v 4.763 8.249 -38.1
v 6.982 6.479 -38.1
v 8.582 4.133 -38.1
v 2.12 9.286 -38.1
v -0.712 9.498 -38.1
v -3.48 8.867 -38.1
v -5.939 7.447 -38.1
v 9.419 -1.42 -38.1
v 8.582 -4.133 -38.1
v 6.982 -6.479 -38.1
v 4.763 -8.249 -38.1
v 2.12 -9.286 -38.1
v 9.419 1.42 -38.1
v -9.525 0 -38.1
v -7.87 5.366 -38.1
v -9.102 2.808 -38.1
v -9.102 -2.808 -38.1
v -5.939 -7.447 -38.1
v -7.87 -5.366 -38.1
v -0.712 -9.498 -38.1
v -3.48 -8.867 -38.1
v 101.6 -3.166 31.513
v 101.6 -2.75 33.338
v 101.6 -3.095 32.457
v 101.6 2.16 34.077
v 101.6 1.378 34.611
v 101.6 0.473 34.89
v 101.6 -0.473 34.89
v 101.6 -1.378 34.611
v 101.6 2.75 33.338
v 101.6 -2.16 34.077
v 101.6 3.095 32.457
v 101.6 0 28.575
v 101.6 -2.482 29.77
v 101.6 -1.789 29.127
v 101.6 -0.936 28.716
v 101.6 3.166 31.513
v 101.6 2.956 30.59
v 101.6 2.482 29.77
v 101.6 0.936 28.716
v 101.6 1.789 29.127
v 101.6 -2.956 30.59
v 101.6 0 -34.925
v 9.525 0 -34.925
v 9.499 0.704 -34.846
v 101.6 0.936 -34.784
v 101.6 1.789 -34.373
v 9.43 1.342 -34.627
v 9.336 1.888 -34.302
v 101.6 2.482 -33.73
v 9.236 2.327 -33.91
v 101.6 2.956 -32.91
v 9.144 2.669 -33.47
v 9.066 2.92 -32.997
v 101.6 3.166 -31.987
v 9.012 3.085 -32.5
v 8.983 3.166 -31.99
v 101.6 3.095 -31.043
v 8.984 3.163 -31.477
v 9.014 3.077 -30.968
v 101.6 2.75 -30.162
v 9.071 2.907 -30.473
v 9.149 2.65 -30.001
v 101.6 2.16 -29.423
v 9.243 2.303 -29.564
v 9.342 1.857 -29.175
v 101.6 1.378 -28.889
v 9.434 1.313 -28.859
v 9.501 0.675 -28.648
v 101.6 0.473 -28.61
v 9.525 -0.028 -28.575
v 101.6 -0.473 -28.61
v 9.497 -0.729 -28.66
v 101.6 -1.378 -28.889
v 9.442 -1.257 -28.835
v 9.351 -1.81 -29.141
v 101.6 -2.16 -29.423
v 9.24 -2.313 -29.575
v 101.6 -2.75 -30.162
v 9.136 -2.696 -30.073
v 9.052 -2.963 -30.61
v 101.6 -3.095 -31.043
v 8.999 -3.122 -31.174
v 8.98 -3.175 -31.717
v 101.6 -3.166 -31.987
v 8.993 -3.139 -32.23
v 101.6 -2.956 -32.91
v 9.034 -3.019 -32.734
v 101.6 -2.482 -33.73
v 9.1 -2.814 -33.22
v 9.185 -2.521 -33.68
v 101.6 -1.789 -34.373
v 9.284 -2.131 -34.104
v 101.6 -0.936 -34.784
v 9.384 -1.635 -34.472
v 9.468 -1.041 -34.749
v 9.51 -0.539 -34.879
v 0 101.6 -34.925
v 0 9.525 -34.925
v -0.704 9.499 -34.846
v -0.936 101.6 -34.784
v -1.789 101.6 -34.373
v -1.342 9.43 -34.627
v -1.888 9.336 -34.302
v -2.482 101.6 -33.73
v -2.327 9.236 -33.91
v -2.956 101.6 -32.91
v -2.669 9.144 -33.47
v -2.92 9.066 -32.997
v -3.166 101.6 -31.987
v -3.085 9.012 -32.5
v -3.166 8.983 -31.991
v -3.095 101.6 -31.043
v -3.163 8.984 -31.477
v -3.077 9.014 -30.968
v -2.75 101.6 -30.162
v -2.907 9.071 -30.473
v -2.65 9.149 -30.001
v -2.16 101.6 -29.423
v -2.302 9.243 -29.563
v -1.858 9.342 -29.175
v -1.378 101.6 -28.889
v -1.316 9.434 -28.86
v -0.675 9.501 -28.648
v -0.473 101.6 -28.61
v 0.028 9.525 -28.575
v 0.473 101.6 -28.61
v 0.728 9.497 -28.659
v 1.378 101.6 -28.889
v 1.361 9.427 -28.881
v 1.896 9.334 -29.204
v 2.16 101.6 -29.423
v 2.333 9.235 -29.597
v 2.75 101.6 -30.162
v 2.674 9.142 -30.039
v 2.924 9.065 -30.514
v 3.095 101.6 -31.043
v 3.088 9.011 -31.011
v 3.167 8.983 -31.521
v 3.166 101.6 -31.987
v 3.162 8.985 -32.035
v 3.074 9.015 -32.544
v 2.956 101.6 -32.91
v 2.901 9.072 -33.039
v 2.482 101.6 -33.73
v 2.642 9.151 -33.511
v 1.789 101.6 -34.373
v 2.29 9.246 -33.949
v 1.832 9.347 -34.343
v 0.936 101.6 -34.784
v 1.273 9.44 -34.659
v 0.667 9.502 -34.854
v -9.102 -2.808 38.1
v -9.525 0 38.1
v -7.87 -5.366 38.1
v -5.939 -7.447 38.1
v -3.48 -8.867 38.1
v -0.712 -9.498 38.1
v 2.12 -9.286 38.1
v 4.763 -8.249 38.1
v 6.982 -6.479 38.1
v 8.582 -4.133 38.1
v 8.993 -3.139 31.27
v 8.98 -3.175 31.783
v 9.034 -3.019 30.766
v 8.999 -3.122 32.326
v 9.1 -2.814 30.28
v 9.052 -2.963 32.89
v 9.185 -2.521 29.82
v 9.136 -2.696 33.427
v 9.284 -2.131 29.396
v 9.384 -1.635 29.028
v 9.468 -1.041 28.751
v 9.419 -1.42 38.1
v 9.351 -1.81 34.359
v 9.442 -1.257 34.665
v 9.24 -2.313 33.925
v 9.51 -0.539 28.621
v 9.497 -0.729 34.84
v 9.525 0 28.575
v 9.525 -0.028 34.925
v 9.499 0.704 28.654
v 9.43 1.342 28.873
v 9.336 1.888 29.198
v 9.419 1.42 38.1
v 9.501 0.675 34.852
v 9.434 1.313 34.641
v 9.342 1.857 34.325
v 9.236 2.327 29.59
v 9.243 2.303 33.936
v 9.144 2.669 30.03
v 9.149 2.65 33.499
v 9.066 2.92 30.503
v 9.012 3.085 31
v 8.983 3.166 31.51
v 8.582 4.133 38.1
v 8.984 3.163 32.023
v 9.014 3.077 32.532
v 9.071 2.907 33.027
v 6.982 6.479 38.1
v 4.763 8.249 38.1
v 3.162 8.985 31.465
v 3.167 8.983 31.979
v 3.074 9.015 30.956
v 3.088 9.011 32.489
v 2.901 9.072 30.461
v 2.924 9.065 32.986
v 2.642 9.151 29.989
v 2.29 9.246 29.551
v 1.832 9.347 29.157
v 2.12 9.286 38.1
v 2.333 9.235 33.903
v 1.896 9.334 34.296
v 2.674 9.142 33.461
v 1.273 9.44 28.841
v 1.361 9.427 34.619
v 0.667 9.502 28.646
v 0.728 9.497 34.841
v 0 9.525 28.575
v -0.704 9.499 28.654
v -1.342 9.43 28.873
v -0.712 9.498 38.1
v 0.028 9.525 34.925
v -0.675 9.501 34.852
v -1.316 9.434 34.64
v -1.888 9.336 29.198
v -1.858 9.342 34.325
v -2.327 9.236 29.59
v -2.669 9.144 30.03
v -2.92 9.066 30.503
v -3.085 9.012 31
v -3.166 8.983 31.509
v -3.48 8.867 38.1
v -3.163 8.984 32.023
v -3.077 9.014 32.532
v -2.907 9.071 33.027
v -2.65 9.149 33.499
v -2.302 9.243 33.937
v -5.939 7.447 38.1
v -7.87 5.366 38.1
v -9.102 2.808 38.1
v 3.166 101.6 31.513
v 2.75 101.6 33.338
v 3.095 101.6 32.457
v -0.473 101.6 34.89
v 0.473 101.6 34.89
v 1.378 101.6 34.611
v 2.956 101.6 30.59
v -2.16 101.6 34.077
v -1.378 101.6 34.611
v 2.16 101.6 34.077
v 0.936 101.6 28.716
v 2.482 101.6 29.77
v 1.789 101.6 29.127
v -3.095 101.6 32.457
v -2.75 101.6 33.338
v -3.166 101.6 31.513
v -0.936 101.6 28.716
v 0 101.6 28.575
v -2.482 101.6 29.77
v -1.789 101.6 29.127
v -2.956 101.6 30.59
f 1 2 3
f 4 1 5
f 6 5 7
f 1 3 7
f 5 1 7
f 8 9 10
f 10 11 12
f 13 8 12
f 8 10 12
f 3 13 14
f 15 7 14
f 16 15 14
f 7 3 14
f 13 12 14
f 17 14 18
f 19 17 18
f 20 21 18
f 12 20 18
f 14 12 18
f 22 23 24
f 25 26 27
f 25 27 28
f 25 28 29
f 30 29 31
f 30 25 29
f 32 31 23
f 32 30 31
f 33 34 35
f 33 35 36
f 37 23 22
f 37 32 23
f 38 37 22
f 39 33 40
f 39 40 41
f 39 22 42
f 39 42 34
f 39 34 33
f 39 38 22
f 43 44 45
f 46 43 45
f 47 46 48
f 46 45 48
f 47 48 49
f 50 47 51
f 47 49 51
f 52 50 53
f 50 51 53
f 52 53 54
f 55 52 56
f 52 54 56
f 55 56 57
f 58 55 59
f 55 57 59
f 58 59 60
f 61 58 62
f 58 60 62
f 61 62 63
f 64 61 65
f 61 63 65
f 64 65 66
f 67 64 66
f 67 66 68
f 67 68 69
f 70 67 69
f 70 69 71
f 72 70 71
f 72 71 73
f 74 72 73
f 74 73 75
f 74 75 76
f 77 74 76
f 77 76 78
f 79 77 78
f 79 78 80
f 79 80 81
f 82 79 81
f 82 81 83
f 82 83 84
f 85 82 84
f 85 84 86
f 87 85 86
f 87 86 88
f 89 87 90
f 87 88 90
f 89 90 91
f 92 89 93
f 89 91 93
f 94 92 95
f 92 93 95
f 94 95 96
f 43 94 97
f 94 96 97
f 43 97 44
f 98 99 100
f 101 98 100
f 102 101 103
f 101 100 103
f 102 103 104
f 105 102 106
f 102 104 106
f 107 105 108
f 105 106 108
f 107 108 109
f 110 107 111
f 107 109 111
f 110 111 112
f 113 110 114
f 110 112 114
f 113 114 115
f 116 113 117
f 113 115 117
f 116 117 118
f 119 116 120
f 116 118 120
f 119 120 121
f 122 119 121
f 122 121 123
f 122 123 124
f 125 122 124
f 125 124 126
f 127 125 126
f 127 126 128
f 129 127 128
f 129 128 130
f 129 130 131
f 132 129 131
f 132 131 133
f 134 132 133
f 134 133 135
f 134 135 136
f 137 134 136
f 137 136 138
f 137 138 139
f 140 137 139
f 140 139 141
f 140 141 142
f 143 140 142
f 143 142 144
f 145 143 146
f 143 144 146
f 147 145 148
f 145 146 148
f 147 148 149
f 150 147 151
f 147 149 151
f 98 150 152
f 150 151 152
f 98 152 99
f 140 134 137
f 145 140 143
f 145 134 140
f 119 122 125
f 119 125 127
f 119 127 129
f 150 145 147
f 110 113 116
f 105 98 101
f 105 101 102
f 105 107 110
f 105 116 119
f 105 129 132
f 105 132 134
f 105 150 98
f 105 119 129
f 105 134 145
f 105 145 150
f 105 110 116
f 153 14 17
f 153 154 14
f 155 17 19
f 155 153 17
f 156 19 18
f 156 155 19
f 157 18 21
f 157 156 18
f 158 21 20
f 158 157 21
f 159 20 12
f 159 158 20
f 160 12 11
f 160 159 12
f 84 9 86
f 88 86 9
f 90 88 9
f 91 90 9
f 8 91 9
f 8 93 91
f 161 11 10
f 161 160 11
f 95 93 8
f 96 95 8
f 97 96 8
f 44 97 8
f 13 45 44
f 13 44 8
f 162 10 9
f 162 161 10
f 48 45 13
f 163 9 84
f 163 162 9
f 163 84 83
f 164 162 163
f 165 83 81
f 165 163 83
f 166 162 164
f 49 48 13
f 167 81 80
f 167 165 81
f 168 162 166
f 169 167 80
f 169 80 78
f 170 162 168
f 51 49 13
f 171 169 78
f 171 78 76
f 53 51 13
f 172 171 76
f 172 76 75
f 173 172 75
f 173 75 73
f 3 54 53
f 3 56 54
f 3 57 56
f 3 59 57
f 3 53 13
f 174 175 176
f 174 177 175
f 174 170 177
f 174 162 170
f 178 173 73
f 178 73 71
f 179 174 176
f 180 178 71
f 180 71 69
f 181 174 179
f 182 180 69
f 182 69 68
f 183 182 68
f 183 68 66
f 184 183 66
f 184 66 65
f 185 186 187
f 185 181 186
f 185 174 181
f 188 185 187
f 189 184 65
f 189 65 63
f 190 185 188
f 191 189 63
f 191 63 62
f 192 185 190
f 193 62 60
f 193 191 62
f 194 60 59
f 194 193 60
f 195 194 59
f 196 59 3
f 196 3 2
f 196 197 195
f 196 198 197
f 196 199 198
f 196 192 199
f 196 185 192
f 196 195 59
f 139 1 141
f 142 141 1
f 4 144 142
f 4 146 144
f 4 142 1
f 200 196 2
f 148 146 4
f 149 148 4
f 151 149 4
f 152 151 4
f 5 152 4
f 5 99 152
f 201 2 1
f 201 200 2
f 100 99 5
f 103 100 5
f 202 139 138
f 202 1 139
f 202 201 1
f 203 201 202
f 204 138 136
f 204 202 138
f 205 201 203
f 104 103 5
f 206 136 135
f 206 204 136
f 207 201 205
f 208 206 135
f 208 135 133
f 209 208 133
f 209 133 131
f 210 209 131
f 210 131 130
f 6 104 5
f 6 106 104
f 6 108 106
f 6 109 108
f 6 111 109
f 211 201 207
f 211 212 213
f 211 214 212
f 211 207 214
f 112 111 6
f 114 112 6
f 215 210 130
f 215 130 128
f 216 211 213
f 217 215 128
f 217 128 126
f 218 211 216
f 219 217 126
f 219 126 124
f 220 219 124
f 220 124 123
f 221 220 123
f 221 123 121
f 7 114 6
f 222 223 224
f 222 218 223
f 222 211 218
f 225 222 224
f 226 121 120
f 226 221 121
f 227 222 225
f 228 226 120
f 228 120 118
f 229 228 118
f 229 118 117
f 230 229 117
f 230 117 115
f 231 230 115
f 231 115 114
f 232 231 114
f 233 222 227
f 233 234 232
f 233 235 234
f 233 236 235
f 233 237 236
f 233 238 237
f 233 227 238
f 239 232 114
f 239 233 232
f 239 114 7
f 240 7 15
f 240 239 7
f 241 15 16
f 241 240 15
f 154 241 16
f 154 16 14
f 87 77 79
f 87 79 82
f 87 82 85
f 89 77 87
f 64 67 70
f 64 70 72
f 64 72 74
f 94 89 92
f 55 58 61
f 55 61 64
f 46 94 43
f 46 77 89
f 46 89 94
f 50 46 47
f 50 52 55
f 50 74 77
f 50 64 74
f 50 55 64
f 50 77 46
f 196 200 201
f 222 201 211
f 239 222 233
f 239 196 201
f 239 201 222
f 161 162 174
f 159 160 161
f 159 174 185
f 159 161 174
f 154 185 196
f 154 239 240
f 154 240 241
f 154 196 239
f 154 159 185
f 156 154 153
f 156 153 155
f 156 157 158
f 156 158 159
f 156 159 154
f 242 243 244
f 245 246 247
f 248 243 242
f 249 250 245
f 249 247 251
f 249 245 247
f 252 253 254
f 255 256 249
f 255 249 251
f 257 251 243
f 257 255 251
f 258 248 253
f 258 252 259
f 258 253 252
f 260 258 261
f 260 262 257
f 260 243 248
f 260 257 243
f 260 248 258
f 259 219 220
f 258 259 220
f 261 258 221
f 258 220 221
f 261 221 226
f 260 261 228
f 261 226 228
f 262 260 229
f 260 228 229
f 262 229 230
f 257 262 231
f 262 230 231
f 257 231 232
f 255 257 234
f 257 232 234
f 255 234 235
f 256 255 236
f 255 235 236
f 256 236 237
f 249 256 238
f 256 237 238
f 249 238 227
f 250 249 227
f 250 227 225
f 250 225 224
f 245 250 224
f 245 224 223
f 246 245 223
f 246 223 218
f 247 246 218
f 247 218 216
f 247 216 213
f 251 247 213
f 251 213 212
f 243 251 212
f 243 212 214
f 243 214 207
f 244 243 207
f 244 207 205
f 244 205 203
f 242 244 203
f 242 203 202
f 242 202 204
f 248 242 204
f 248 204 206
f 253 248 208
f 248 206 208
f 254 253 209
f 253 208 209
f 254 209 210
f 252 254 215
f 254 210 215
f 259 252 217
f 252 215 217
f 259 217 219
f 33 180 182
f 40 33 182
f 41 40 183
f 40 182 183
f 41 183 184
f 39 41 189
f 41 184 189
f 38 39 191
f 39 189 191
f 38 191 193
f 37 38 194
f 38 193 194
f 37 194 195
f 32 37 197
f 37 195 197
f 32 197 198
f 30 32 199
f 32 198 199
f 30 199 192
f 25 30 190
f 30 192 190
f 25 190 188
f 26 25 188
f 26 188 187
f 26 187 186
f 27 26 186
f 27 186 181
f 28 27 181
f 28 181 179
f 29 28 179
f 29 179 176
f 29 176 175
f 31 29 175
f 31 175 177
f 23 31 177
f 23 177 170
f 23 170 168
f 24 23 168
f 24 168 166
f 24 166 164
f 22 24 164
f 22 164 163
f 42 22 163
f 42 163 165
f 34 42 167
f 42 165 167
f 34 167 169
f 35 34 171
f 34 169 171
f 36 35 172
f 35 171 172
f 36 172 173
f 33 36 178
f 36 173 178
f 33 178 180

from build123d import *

# Parameters (mm, degrees)
SKETCH1_R           = 9.525
BOSS_EXTRUDE1_DEPTH = 38.1
SKETCH2_R           = 3.175
BOSS_EXTRUDE2_DEPTH = 101.6
SKETCH3_R           = 3.175
BOSS_EXTRUDE3_DEPTH = 101.6


with BuildPart() as part:
    # Sketch1 → Boss-Extrude1 (new, symmetric)
    with BuildSketch(Plane.XY):
        with Locations(Location((0, 0, 0), (0, 0, 180))):
            Circle(SKETCH1_R)
    extrude(amount=BOSS_EXTRUDE1_DEPTH, both=True)

    # Sketch2 → Boss-Extrude2 (add)
    with BuildSketch(Plane(origin=(0, 0, 0), x_dir=(0, 0, -1), z_dir=(1, 0, 0))):
        with Locations((-31.75, 0)):
            Circle(SKETCH2_R)
        with Locations((31.75, 0)):
            Circle(SKETCH2_R)
    extrude(amount=BOSS_EXTRUDE2_DEPTH)

    # Sketch3 → Boss-Extrude3 (add)
    with BuildSketch(Plane(origin=(0, 0, 0), x_dir=(1, 0, 0), z_dir=(0, 1, 0))):
        with Locations(Location((0, 31.75, 0), (0, 0, 90))):
            Circle(SKETCH3_R)
        with Locations(Location((0, -31.75, 0), (0, 0, 90))):
            Circle(SKETCH3_R)
    extrude(amount=BOSS_EXTRUDE3_DEPTH)


solid = part.part
